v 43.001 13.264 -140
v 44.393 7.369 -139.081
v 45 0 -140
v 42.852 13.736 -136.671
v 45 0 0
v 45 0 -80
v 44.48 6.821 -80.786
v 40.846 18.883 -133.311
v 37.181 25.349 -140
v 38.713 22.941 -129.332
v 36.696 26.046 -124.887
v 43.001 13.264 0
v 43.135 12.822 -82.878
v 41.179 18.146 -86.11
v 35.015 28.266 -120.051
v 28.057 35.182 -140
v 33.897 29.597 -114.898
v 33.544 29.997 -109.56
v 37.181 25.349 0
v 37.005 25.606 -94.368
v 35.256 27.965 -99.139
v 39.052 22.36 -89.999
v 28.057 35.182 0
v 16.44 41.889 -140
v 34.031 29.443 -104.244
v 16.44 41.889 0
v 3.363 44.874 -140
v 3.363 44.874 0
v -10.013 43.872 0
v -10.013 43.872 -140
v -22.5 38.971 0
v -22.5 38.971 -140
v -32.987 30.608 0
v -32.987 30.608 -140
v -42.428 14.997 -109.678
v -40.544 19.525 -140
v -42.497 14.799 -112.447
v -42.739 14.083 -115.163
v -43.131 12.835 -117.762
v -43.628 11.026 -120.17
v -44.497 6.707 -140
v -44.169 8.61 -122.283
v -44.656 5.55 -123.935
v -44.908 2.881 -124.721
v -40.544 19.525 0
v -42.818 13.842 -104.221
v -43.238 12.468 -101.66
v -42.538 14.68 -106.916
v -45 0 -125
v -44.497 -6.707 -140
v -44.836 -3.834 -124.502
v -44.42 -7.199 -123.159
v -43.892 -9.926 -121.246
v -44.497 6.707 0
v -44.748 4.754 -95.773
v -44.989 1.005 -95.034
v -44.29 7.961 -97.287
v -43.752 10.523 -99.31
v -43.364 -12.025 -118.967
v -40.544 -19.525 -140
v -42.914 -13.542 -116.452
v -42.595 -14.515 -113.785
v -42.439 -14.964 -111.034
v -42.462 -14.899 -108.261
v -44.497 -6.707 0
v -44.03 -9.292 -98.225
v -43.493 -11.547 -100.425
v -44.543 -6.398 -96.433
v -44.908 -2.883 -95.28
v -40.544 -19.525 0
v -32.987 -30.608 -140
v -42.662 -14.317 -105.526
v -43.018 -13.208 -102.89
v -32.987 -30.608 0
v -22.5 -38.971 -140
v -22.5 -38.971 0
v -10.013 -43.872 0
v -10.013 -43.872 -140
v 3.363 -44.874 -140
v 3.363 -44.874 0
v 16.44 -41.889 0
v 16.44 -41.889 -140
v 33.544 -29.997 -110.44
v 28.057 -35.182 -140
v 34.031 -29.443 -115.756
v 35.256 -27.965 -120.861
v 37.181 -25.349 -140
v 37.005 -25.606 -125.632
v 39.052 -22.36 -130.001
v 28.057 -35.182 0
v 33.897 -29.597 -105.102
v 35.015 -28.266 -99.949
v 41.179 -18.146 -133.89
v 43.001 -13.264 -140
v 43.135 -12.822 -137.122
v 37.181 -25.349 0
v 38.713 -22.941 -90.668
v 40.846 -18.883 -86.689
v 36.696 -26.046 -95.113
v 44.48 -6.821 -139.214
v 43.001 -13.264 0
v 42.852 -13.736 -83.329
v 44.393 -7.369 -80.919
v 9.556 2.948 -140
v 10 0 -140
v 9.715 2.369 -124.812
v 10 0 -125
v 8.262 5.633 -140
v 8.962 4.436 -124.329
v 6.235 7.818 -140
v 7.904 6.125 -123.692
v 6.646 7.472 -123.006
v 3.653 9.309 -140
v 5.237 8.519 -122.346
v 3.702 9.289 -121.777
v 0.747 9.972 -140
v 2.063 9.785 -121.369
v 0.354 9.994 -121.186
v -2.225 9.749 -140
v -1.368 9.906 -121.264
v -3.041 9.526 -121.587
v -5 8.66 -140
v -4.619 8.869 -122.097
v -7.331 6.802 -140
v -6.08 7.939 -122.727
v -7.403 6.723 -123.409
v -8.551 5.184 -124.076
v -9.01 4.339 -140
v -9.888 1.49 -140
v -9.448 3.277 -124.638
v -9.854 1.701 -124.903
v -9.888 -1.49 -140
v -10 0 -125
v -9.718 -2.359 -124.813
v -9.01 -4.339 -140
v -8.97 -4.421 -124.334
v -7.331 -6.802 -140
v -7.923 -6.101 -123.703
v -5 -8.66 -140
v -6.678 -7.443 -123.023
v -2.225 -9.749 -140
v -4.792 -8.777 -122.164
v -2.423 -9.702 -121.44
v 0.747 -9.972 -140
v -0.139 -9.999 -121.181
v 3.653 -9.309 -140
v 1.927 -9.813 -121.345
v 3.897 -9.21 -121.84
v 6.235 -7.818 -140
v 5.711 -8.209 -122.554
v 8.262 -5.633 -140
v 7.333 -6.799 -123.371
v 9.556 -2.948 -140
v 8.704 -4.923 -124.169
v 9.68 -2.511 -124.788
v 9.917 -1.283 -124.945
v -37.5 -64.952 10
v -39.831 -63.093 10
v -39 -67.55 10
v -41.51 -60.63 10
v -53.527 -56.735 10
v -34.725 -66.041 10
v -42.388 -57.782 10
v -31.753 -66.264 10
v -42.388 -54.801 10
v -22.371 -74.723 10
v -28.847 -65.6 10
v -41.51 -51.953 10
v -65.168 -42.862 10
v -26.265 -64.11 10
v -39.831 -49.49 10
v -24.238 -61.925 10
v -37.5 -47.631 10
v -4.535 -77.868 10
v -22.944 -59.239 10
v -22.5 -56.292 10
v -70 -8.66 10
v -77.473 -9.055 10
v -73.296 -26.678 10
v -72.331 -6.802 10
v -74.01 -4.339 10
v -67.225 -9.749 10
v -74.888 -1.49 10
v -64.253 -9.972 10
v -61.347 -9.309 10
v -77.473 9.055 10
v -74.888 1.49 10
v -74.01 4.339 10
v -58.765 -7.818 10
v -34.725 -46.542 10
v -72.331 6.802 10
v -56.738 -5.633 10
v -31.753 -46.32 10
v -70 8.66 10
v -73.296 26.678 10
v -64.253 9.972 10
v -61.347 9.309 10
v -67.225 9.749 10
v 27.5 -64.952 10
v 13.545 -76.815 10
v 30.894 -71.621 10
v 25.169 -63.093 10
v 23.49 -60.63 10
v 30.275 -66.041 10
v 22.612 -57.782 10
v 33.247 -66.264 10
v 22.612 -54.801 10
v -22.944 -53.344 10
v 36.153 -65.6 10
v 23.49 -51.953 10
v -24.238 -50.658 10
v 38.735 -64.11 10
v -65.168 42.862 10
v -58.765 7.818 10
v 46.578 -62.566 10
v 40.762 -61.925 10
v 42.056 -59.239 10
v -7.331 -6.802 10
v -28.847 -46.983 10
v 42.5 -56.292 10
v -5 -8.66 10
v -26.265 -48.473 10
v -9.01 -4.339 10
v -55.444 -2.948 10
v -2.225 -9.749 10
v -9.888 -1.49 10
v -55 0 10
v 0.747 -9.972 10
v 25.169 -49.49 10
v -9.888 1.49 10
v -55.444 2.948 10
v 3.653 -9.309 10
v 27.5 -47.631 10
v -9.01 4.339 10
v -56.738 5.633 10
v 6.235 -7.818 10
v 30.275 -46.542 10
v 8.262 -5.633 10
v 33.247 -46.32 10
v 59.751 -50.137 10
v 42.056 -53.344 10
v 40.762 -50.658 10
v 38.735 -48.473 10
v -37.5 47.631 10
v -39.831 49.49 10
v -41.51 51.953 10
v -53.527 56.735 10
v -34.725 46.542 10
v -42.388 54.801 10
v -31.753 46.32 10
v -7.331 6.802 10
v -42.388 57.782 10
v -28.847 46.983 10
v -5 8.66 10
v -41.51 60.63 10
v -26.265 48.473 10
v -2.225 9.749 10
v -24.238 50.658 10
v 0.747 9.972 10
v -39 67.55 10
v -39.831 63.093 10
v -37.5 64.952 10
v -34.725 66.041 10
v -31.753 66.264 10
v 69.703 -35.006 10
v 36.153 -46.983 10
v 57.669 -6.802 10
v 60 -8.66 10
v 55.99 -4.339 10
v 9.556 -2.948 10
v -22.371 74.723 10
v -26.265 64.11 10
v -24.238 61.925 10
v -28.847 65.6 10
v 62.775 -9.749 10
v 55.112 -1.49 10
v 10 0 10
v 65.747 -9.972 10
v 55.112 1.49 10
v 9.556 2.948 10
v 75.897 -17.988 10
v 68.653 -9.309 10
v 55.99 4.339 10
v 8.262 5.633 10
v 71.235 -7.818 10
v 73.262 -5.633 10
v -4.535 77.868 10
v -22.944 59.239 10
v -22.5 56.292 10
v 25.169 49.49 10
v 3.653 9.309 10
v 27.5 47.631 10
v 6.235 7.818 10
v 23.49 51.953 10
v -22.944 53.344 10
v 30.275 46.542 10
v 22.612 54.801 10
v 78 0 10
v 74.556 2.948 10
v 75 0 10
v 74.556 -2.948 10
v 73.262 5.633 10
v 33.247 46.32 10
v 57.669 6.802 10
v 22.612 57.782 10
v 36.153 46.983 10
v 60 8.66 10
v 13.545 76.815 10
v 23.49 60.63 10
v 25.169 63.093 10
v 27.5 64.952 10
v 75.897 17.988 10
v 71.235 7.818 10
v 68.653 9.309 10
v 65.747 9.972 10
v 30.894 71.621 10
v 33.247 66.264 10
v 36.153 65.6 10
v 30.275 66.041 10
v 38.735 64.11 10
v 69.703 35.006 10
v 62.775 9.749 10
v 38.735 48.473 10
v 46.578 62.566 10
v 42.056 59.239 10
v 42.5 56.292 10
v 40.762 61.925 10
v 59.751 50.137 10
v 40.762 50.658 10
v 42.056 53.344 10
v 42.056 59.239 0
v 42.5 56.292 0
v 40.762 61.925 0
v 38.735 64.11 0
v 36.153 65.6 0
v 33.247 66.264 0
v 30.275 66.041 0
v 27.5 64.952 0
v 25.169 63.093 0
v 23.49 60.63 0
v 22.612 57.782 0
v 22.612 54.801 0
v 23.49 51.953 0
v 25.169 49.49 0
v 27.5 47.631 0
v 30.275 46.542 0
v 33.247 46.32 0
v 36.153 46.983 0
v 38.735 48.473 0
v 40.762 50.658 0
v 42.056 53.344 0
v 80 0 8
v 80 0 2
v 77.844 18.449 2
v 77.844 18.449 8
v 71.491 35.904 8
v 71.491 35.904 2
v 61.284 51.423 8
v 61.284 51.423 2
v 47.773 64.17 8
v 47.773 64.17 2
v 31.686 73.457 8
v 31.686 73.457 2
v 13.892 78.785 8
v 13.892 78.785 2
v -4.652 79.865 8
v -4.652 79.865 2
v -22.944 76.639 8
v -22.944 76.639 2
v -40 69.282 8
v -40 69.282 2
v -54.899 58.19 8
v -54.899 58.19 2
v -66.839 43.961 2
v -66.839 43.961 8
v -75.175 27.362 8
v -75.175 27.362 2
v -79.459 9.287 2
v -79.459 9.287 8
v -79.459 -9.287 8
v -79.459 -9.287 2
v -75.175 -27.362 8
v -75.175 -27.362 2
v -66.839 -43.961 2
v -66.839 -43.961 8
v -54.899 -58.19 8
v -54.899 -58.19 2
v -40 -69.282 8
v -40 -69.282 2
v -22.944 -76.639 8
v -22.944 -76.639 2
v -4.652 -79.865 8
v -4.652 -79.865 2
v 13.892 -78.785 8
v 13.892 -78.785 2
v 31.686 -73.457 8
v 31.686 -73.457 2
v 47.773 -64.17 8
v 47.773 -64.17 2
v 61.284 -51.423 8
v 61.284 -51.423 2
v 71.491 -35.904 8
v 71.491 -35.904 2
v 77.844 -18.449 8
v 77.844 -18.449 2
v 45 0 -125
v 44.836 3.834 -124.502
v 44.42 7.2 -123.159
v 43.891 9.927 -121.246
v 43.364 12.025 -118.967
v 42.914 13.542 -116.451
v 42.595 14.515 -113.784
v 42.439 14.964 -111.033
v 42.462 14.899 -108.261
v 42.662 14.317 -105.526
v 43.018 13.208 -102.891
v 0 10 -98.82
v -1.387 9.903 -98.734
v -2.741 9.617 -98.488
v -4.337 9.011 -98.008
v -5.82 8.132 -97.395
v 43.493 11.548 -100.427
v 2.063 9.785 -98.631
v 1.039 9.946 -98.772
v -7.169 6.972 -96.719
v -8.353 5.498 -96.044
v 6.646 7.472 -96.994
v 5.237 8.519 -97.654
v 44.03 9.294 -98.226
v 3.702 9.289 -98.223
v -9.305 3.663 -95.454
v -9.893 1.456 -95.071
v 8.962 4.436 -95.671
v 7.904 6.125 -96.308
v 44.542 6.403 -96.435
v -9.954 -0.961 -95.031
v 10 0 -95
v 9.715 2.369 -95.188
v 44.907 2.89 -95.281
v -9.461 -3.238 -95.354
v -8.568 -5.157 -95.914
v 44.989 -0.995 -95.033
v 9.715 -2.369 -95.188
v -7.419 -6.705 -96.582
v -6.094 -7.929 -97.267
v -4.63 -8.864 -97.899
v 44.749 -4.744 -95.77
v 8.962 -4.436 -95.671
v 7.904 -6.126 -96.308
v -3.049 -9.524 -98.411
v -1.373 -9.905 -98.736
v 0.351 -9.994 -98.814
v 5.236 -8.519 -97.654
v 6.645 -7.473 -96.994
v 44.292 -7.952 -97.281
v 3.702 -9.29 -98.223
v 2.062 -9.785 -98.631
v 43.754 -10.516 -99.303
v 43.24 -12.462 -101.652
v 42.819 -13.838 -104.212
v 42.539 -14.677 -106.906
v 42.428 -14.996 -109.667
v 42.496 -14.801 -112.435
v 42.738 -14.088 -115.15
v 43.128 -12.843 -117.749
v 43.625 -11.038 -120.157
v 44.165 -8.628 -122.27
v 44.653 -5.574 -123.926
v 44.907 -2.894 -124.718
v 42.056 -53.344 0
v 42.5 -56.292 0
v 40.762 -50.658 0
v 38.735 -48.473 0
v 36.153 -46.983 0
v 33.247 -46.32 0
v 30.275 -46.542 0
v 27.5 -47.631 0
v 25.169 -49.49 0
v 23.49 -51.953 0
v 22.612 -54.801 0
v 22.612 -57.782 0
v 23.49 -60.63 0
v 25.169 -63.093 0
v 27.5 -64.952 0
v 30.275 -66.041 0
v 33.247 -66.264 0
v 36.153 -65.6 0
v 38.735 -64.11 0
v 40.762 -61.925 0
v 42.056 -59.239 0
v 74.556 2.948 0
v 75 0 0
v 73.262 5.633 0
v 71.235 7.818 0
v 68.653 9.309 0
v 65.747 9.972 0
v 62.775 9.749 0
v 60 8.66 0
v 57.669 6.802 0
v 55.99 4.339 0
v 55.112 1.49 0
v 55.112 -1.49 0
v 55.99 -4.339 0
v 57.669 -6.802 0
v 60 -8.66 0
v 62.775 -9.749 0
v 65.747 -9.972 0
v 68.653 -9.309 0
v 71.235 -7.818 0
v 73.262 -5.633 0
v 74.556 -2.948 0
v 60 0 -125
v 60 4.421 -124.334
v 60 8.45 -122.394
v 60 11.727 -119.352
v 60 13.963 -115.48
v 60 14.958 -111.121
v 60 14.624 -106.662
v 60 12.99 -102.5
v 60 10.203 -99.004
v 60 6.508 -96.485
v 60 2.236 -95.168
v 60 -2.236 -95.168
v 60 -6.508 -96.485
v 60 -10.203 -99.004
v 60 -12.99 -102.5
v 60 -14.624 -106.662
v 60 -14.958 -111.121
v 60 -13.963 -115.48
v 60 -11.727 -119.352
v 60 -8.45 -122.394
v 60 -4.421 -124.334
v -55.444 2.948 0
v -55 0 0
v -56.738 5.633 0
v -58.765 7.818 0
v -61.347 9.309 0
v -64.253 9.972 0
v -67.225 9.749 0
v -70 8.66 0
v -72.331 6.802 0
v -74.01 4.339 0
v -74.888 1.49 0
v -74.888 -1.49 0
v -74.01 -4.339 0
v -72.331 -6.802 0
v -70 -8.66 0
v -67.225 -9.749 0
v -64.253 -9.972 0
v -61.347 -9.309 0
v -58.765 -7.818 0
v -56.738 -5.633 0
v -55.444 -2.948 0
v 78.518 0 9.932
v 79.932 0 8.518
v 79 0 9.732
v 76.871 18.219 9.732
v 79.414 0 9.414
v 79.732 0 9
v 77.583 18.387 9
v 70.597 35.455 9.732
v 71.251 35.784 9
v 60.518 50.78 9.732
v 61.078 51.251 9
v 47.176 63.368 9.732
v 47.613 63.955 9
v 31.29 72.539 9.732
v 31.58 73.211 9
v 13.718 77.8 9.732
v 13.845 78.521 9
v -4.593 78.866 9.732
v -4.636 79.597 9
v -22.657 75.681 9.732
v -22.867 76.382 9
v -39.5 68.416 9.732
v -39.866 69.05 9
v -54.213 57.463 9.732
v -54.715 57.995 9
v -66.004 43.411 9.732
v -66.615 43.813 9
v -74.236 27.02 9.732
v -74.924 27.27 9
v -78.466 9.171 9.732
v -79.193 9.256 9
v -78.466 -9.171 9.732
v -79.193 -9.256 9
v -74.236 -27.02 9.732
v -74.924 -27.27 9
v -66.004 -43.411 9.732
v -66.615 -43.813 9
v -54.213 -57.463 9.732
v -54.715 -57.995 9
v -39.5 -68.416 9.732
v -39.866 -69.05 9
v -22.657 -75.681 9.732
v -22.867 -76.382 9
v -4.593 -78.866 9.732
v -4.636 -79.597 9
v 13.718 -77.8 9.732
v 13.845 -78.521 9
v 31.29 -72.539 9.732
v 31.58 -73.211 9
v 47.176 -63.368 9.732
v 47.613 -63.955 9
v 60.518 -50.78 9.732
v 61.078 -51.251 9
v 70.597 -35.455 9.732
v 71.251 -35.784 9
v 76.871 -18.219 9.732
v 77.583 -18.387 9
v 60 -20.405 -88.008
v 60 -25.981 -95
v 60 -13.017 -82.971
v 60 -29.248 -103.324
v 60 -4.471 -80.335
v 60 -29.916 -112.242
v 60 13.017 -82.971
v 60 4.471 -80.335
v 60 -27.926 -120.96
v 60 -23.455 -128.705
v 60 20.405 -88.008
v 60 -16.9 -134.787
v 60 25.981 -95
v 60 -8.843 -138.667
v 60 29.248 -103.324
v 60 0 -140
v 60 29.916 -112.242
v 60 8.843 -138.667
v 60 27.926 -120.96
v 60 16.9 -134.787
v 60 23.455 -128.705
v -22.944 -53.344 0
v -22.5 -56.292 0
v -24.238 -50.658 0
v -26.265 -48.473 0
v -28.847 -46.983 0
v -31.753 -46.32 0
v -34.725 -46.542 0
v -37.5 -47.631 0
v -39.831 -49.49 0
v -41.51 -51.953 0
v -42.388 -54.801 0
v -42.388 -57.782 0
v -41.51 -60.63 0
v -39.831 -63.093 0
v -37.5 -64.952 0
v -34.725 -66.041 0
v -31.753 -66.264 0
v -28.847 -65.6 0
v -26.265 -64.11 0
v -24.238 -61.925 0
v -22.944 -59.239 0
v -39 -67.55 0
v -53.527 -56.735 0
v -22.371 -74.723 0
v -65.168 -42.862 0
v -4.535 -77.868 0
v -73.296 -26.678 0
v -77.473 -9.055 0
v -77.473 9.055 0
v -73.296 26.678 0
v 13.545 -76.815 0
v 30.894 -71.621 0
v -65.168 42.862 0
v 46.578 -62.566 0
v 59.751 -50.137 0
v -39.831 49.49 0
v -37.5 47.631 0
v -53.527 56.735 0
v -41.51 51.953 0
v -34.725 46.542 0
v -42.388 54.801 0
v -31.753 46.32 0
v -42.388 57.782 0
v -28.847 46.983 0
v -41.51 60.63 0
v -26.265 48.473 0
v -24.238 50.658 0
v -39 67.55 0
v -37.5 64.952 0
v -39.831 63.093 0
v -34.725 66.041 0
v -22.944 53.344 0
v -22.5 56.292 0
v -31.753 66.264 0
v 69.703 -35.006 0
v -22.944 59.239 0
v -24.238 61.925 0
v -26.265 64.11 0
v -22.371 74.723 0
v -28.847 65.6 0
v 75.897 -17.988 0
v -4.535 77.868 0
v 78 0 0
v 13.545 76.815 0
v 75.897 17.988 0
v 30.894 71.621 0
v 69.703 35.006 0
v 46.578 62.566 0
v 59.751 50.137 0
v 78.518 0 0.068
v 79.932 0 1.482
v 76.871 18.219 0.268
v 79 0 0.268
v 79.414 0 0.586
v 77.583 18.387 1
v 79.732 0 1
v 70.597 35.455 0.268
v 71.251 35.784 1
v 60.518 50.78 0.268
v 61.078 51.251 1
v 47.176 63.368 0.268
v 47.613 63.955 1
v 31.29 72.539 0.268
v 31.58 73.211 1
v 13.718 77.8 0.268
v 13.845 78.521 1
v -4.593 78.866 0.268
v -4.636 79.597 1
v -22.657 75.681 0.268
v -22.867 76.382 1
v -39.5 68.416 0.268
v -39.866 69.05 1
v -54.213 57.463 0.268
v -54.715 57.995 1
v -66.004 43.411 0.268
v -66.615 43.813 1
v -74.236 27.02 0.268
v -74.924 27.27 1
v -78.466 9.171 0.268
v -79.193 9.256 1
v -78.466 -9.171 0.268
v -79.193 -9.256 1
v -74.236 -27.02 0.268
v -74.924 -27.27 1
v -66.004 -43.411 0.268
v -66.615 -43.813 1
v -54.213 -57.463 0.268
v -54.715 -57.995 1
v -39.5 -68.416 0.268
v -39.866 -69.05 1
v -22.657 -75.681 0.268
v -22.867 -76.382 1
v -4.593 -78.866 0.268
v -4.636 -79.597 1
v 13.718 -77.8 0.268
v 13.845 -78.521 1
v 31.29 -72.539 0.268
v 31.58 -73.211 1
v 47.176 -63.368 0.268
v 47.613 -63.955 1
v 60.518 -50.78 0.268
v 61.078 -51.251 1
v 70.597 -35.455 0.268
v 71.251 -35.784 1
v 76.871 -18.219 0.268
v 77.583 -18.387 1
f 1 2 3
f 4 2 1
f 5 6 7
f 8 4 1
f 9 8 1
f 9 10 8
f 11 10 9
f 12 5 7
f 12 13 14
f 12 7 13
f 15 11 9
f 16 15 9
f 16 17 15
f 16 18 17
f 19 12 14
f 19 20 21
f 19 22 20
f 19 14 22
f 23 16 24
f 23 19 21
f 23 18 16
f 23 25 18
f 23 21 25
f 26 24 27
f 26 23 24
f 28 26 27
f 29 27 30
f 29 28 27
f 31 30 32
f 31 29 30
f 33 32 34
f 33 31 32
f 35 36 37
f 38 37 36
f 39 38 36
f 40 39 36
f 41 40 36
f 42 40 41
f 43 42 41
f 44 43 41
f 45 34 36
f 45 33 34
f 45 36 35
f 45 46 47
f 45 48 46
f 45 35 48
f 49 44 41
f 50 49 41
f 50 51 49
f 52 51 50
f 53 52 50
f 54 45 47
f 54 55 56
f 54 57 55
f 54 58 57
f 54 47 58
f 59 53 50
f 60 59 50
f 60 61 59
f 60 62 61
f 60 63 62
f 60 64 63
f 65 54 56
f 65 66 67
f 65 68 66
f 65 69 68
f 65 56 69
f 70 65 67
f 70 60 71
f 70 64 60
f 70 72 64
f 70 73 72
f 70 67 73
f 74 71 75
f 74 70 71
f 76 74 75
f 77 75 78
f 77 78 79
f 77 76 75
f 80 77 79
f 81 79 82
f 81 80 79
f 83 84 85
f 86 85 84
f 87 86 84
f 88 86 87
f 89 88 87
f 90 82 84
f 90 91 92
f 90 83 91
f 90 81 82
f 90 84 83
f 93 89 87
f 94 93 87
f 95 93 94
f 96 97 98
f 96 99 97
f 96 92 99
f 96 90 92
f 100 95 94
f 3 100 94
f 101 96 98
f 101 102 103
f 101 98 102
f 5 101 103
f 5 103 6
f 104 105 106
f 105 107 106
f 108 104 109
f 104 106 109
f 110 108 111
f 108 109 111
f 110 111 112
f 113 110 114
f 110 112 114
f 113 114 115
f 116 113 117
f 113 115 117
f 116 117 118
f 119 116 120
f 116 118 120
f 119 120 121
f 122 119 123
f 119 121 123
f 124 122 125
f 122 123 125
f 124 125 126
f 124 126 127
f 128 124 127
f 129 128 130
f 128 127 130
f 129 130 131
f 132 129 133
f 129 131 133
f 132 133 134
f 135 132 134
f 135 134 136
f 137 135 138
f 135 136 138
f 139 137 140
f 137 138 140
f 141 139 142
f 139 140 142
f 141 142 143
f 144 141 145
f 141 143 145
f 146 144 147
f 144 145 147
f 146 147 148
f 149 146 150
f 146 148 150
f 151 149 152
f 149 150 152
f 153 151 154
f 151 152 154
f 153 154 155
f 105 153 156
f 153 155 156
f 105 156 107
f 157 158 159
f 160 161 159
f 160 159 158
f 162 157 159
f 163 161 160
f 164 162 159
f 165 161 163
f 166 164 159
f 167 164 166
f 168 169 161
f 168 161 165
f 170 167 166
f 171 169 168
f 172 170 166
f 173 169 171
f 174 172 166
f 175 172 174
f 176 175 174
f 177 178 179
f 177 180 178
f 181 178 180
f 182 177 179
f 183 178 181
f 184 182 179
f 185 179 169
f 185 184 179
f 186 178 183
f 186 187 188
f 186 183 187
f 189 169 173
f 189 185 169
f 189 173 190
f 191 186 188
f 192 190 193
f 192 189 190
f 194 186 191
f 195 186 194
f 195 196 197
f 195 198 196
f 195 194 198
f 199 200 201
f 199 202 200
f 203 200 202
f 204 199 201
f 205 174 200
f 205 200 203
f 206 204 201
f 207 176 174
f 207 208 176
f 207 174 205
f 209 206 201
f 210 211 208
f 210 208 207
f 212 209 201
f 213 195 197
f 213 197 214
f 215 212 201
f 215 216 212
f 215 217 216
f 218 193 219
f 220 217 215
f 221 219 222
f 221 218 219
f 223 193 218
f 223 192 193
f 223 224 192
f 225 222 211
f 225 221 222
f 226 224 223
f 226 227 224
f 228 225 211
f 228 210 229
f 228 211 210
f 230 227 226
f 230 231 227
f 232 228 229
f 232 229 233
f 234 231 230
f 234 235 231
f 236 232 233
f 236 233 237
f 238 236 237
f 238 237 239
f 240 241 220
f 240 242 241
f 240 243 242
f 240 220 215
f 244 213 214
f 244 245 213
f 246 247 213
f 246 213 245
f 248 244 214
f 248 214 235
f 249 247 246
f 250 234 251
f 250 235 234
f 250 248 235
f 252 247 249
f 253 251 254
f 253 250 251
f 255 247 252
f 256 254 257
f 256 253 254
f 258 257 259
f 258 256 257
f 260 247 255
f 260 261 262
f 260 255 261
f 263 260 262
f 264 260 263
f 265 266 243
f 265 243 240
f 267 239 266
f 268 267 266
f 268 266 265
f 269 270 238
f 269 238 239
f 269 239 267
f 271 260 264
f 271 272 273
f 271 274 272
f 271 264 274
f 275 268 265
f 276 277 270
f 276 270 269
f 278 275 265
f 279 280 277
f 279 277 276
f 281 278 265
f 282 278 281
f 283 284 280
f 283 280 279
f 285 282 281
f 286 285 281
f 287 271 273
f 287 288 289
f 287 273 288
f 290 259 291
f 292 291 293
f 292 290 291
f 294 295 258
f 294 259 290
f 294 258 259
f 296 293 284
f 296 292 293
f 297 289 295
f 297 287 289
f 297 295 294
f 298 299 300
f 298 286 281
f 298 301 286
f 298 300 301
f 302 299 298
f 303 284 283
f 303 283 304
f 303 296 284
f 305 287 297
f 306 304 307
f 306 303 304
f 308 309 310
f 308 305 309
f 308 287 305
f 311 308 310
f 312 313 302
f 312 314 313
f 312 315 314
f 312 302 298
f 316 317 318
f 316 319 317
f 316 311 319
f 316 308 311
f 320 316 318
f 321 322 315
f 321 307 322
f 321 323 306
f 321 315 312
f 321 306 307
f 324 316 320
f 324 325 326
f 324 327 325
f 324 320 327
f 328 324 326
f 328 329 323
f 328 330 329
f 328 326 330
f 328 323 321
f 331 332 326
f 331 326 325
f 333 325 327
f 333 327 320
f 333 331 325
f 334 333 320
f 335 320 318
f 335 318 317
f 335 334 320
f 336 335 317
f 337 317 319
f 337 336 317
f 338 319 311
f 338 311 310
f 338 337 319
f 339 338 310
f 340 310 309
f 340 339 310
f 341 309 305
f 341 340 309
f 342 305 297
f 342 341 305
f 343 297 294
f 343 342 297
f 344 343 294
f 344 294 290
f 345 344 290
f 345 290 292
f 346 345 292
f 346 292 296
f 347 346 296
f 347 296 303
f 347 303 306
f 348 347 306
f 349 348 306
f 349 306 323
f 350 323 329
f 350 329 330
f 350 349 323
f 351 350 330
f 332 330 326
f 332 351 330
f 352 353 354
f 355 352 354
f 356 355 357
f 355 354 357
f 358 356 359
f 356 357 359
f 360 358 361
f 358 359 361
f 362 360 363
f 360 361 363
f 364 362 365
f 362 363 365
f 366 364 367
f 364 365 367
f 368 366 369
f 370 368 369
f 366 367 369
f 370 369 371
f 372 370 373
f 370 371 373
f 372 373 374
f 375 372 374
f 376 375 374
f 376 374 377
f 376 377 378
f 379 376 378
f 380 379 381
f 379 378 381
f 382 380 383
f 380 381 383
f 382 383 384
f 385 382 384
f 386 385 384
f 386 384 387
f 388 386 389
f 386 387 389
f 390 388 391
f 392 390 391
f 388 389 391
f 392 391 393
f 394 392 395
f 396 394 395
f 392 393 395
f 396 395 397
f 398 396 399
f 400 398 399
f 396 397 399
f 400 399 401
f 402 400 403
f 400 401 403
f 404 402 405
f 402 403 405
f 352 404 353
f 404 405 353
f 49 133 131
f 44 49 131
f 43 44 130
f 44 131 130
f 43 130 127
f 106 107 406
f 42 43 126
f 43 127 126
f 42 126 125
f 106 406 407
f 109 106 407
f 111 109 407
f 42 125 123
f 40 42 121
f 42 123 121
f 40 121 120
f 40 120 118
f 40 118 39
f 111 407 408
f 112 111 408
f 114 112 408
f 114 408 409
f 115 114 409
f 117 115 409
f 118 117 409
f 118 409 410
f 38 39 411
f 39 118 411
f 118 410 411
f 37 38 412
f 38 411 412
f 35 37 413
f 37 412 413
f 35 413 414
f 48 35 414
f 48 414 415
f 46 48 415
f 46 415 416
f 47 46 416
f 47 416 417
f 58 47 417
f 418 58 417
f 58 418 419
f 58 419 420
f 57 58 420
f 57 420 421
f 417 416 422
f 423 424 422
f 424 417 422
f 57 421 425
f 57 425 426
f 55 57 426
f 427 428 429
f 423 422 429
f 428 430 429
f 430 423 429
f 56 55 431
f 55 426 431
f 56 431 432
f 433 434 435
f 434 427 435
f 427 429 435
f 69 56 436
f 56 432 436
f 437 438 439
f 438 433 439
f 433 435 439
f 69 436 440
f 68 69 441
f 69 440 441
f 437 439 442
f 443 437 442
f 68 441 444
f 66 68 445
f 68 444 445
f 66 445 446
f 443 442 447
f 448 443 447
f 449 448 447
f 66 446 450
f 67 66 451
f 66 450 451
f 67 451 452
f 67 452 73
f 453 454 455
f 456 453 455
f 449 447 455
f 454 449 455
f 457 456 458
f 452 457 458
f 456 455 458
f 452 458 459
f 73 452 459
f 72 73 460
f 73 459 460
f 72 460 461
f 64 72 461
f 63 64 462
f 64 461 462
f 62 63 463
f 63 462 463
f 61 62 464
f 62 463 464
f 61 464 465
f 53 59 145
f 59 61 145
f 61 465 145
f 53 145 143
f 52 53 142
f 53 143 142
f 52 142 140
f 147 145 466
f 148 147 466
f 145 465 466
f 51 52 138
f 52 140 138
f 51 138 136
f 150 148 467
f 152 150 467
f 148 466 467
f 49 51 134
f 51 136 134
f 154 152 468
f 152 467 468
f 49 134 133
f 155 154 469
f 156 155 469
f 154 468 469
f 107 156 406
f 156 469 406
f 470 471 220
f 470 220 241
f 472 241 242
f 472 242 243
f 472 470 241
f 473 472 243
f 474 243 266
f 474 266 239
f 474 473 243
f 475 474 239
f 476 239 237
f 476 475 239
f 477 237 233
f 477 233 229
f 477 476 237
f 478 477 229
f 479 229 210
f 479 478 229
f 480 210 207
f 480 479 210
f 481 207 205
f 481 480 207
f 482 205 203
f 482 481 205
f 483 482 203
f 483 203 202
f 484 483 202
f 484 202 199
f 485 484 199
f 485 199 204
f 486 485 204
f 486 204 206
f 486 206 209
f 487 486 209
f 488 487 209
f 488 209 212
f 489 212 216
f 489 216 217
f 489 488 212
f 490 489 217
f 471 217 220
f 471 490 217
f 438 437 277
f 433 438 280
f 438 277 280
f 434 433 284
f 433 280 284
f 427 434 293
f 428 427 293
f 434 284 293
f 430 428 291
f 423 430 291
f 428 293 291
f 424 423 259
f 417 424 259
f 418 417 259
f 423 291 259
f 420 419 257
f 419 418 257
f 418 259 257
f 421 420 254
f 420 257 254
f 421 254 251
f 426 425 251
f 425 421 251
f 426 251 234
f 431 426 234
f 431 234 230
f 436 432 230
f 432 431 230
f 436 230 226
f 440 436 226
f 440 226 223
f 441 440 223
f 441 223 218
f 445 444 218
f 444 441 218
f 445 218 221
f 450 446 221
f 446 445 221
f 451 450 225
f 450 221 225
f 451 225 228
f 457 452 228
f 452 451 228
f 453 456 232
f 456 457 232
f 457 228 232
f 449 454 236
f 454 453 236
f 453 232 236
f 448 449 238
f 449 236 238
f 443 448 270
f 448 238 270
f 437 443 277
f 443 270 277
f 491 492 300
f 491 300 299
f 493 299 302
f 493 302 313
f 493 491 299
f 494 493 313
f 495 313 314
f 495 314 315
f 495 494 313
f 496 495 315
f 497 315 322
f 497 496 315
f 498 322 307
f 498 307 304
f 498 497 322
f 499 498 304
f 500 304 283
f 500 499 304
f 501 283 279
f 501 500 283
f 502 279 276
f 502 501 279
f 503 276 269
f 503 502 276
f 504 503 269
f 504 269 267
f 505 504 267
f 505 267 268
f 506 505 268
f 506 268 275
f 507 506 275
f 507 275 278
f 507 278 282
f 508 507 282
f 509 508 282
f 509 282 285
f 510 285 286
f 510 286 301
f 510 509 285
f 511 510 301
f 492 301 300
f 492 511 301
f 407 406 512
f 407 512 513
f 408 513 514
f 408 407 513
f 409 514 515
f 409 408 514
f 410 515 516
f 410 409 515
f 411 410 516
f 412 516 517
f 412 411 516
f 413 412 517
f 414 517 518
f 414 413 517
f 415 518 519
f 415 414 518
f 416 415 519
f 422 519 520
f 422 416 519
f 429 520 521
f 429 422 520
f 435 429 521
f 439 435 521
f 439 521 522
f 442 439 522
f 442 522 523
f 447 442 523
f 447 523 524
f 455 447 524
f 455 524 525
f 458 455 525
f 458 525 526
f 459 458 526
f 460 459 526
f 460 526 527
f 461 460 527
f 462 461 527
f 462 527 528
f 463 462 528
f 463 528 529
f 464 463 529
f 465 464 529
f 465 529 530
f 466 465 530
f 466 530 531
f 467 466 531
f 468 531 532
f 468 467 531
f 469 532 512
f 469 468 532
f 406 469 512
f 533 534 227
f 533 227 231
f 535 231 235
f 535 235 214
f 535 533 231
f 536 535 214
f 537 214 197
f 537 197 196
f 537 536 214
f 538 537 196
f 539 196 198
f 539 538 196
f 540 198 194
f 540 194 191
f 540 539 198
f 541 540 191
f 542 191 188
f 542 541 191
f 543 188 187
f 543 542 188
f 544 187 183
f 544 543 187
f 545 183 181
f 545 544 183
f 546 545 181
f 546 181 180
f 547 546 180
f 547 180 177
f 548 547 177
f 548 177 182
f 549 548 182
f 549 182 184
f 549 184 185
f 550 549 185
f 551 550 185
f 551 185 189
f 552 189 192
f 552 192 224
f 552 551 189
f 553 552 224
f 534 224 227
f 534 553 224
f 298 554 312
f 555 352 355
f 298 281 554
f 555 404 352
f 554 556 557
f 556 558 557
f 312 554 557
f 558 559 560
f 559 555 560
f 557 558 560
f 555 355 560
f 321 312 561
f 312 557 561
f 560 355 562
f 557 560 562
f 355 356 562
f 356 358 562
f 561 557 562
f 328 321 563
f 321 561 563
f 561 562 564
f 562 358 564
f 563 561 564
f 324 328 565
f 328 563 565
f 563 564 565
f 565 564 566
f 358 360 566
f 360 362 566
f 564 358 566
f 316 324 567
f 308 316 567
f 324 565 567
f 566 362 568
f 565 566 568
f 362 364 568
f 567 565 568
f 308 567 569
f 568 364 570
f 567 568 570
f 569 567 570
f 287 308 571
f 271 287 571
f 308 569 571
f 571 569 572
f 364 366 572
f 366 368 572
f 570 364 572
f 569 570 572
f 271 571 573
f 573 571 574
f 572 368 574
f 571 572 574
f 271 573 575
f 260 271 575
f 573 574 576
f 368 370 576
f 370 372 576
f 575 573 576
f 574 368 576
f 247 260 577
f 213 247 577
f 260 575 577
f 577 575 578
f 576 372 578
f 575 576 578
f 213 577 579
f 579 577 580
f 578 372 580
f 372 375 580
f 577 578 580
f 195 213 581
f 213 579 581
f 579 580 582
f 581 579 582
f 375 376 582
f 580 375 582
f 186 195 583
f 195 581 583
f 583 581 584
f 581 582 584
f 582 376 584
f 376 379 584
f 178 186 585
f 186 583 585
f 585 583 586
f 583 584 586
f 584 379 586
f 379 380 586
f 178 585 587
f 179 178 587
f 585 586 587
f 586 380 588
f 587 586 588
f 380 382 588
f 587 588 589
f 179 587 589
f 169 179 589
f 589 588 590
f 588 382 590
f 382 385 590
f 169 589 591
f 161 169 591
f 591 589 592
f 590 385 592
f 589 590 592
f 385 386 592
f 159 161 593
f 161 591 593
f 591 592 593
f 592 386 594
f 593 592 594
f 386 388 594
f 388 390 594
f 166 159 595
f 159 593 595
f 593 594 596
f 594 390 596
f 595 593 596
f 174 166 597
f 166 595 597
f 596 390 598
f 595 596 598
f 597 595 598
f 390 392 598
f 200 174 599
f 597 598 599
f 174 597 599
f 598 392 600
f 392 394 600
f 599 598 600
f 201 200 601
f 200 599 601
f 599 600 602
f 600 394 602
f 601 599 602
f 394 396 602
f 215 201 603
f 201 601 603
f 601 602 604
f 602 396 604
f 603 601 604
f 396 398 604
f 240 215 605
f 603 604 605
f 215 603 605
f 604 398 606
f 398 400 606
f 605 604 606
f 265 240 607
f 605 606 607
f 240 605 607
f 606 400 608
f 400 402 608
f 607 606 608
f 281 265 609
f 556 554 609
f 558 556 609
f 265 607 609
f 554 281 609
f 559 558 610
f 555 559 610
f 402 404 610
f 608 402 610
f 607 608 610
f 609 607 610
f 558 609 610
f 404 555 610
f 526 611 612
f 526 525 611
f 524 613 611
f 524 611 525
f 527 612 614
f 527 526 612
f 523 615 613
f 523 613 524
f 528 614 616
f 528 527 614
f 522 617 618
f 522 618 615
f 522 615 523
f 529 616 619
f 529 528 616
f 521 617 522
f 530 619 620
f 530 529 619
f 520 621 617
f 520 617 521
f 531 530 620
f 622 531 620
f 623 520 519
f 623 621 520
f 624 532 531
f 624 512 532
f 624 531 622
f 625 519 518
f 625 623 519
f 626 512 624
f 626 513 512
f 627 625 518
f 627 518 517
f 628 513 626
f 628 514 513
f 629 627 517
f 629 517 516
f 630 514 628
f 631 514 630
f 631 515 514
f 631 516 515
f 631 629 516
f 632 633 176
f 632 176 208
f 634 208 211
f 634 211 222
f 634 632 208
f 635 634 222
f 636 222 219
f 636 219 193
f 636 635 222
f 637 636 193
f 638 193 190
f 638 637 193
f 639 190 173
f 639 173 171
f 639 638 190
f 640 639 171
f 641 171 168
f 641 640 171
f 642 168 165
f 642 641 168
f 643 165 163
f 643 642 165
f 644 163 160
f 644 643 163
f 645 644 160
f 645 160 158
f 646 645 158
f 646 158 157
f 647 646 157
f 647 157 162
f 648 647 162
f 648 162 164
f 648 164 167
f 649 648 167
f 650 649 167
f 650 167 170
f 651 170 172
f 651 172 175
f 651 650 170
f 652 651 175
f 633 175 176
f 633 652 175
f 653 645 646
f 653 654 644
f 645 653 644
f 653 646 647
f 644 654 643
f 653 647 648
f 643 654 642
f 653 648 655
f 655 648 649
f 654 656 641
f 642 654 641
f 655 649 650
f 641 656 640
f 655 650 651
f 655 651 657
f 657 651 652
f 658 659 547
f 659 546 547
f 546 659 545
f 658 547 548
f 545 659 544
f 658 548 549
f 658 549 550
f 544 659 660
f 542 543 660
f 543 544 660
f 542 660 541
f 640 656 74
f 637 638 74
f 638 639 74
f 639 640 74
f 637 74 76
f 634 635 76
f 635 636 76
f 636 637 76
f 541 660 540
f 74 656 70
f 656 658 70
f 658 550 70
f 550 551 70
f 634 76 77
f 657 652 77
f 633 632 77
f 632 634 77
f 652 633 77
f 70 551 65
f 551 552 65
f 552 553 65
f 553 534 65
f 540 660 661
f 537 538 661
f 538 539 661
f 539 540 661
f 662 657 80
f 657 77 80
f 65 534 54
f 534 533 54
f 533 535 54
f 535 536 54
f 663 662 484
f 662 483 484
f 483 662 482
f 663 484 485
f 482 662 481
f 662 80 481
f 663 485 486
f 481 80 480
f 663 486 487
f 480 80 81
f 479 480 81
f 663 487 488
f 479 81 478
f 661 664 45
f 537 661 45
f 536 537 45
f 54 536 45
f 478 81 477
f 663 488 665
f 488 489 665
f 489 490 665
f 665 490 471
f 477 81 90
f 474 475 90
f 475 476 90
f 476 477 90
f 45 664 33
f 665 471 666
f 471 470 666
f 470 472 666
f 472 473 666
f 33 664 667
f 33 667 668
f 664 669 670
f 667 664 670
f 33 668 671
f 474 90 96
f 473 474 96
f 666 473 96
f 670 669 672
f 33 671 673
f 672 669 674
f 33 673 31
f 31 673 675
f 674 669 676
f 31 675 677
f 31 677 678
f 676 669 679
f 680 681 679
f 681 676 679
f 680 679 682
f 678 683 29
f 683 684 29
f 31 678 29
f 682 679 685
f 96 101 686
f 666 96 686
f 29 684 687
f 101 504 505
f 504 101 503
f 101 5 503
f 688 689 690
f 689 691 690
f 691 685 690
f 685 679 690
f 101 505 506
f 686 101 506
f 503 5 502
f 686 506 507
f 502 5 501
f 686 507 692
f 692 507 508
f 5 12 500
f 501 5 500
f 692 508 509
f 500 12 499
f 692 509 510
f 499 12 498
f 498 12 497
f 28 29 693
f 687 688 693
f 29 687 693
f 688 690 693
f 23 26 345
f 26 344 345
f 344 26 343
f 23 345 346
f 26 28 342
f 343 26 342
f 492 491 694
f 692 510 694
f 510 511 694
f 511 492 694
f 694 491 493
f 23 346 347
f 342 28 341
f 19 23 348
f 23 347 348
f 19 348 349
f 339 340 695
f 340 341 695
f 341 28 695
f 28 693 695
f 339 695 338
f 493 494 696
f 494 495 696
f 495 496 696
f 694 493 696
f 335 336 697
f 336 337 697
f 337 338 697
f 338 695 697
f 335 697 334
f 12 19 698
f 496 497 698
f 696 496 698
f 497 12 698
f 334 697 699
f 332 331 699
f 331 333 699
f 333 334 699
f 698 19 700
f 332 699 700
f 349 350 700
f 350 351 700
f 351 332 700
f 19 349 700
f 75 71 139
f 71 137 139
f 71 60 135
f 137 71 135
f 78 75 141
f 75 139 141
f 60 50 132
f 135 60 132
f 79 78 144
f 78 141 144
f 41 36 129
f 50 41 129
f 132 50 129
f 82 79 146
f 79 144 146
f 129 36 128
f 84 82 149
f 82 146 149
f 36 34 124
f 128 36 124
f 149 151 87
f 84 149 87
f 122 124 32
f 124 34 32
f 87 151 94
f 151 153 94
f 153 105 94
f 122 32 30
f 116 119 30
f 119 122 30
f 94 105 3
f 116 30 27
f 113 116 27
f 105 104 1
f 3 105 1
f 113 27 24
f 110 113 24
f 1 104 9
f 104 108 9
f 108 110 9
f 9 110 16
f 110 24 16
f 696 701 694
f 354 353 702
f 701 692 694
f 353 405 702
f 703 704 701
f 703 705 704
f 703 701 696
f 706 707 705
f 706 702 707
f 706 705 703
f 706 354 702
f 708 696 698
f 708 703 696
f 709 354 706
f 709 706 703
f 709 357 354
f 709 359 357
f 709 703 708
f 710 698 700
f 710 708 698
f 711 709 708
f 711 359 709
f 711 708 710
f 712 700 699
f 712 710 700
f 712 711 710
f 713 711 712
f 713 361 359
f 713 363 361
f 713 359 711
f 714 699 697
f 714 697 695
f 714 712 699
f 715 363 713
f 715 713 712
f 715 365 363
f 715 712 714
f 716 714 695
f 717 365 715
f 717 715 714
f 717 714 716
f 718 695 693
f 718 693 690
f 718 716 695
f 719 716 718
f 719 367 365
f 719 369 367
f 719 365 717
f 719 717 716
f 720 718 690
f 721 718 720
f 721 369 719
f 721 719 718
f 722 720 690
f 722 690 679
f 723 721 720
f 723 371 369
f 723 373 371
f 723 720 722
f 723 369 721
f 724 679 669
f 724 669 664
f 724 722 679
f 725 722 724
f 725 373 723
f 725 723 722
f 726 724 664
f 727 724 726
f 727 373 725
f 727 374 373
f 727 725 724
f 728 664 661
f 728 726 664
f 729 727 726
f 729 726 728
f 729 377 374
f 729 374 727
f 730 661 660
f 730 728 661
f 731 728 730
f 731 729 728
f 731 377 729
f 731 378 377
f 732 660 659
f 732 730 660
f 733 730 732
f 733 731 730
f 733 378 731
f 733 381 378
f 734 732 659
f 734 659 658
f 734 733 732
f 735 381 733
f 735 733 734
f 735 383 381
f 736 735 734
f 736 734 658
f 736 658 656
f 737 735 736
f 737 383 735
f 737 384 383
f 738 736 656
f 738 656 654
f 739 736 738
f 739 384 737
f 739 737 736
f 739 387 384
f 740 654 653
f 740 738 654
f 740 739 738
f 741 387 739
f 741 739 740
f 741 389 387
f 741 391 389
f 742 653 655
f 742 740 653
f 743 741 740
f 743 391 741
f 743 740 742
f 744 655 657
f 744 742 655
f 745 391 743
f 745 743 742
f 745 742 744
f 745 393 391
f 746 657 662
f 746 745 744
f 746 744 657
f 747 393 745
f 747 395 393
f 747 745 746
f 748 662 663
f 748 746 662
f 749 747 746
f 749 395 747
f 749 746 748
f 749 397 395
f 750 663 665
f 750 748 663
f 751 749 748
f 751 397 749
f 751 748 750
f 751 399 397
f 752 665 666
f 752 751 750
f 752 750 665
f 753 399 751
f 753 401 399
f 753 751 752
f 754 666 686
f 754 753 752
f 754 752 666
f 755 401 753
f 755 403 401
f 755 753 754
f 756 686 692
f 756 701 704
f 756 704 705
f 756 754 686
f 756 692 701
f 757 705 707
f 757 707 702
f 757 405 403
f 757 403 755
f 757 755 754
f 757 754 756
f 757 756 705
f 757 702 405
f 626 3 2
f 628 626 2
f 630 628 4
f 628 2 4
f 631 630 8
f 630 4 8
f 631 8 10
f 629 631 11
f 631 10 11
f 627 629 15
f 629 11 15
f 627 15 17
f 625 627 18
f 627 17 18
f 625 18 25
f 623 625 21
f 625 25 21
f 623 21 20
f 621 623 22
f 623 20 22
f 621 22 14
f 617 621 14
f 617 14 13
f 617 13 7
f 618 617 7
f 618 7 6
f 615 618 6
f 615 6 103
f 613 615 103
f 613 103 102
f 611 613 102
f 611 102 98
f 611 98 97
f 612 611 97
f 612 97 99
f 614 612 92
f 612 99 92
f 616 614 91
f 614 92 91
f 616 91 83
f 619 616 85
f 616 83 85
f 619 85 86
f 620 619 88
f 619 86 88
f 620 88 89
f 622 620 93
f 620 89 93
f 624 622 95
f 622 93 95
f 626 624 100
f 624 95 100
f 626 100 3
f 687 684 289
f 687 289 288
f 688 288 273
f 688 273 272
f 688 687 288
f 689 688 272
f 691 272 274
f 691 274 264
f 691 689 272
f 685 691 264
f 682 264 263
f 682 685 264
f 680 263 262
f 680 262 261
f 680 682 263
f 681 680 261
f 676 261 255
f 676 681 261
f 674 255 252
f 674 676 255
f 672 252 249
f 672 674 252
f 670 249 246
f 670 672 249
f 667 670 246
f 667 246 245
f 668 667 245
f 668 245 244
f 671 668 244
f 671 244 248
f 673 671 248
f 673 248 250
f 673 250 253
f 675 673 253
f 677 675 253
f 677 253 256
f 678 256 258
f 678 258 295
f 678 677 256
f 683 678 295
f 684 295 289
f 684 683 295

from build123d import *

# Parameters (mm, degrees)
SKETCH_1_R          = 80
EXTRUDE_1_DEPTH     = 10
SKETCH_2_R          = 10
CUT_EXTRUDE_1_DEPTH = 10
SKETCH_3_R          = 45
EXTRUDE_2_DEPTH     = 140
SKETCH_6_R          = 10
CUT_EXTRUDE_3_DEPTH = 181
SKETCH_7_R          = 30
SKETCH_7_R_2        = 15
EXTRUDE_3_DEPTH     = 60
SKETCH_8_R          = 15
CUT_EXTRUDE_4_DEPTH = 45
SKETCH_9_R          = 10
CUT_EXTRUDE_5_DEPTH = 200
FILLET_1_R          = 2


with BuildPart() as part:
    # 草图1 → 凸台-拉伸1 (new body)
    with BuildSketch(Plane.XY):
        Circle(SKETCH_1_R)
    extrude(amount=EXTRUDE_1_DEPTH)

    # 草图2 → 切除-拉伸1 (cut)
    with BuildSketch(Plane.XY):
        with Locations((32.5, 56.291651246)):
            Circle(SKETCH_2_R)
        with Locations((-32.5, -56.291651246)):
            Circle(SKETCH_2_R)
        with Locations((-65, 0)):
            Circle(SKETCH_2_R)
        with Locations((-32.5, 56.291651246)):
            Circle(SKETCH_2_R)
        with Locations((65, 0)):
            Circle(SKETCH_2_R)
        with Locations((32.5, -56.291651246)):
            Circle(SKETCH_2_R)
    extrude(amount=CUT_EXTRUDE_1_DEPTH, mode=Mode.SUBTRACT)

    # 草图3 → 凸台-拉伸2 (add)
    with BuildSketch(Plane.XY):
        Circle(SKETCH_3_R)
    extrude(amount=-EXTRUDE_2_DEPTH)

    # 草图6 → 切除-拉伸3 (cut, through all)
    with BuildSketch(Plane.XY):
        Circle(SKETCH_6_R)
    extrude(amount=-CUT_EXTRUDE_3_DEPTH, mode=Mode.SUBTRACT)

    # 草图7 → 凸台-拉伸3 (add)
    with BuildSketch(Plane(origin=(0, 0, 0), x_dir=(0, 0, -1), z_dir=(1, 0, 0))):
        with Locations((110, 0)):
            Circle(SKETCH_7_R)
        with Locations((110, 0)):
            Circle(SKETCH_7_R_2, mode=Mode.SUBTRACT)
    extrude(amount=EXTRUDE_3_DEPTH)

    # 草图8 → 切除-拉伸4 (cut, symmetric)
    with BuildSketch(Plane(origin=(0, 0, 0), x_dir=(0, 0, -1), z_dir=(1, 0, 0))):
        with Locations((110, 0)):
            Circle(SKETCH_8_R)
    extrude(amount=CUT_EXTRUDE_4_DEPTH, both=True, mode=Mode.SUBTRACT)

    # 草图9 → 切除-拉伸5 (cut)
    with BuildSketch(Plane.XY.offset(10)):
        Circle(SKETCH_9_R)
    extrude(amount=-CUT_EXTRUDE_5_DEPTH, mode=Mode.SUBTRACT)

    # 圆角1
    fillet_1_edges = [part.edges().sort_by_distance(p)[0] for p in [
        (-80, 0, 0),
        (-80, 0, 10),
    ]]
    fillet(fillet_1_edges, radius=FILLET_1_R)


solid = part.part
